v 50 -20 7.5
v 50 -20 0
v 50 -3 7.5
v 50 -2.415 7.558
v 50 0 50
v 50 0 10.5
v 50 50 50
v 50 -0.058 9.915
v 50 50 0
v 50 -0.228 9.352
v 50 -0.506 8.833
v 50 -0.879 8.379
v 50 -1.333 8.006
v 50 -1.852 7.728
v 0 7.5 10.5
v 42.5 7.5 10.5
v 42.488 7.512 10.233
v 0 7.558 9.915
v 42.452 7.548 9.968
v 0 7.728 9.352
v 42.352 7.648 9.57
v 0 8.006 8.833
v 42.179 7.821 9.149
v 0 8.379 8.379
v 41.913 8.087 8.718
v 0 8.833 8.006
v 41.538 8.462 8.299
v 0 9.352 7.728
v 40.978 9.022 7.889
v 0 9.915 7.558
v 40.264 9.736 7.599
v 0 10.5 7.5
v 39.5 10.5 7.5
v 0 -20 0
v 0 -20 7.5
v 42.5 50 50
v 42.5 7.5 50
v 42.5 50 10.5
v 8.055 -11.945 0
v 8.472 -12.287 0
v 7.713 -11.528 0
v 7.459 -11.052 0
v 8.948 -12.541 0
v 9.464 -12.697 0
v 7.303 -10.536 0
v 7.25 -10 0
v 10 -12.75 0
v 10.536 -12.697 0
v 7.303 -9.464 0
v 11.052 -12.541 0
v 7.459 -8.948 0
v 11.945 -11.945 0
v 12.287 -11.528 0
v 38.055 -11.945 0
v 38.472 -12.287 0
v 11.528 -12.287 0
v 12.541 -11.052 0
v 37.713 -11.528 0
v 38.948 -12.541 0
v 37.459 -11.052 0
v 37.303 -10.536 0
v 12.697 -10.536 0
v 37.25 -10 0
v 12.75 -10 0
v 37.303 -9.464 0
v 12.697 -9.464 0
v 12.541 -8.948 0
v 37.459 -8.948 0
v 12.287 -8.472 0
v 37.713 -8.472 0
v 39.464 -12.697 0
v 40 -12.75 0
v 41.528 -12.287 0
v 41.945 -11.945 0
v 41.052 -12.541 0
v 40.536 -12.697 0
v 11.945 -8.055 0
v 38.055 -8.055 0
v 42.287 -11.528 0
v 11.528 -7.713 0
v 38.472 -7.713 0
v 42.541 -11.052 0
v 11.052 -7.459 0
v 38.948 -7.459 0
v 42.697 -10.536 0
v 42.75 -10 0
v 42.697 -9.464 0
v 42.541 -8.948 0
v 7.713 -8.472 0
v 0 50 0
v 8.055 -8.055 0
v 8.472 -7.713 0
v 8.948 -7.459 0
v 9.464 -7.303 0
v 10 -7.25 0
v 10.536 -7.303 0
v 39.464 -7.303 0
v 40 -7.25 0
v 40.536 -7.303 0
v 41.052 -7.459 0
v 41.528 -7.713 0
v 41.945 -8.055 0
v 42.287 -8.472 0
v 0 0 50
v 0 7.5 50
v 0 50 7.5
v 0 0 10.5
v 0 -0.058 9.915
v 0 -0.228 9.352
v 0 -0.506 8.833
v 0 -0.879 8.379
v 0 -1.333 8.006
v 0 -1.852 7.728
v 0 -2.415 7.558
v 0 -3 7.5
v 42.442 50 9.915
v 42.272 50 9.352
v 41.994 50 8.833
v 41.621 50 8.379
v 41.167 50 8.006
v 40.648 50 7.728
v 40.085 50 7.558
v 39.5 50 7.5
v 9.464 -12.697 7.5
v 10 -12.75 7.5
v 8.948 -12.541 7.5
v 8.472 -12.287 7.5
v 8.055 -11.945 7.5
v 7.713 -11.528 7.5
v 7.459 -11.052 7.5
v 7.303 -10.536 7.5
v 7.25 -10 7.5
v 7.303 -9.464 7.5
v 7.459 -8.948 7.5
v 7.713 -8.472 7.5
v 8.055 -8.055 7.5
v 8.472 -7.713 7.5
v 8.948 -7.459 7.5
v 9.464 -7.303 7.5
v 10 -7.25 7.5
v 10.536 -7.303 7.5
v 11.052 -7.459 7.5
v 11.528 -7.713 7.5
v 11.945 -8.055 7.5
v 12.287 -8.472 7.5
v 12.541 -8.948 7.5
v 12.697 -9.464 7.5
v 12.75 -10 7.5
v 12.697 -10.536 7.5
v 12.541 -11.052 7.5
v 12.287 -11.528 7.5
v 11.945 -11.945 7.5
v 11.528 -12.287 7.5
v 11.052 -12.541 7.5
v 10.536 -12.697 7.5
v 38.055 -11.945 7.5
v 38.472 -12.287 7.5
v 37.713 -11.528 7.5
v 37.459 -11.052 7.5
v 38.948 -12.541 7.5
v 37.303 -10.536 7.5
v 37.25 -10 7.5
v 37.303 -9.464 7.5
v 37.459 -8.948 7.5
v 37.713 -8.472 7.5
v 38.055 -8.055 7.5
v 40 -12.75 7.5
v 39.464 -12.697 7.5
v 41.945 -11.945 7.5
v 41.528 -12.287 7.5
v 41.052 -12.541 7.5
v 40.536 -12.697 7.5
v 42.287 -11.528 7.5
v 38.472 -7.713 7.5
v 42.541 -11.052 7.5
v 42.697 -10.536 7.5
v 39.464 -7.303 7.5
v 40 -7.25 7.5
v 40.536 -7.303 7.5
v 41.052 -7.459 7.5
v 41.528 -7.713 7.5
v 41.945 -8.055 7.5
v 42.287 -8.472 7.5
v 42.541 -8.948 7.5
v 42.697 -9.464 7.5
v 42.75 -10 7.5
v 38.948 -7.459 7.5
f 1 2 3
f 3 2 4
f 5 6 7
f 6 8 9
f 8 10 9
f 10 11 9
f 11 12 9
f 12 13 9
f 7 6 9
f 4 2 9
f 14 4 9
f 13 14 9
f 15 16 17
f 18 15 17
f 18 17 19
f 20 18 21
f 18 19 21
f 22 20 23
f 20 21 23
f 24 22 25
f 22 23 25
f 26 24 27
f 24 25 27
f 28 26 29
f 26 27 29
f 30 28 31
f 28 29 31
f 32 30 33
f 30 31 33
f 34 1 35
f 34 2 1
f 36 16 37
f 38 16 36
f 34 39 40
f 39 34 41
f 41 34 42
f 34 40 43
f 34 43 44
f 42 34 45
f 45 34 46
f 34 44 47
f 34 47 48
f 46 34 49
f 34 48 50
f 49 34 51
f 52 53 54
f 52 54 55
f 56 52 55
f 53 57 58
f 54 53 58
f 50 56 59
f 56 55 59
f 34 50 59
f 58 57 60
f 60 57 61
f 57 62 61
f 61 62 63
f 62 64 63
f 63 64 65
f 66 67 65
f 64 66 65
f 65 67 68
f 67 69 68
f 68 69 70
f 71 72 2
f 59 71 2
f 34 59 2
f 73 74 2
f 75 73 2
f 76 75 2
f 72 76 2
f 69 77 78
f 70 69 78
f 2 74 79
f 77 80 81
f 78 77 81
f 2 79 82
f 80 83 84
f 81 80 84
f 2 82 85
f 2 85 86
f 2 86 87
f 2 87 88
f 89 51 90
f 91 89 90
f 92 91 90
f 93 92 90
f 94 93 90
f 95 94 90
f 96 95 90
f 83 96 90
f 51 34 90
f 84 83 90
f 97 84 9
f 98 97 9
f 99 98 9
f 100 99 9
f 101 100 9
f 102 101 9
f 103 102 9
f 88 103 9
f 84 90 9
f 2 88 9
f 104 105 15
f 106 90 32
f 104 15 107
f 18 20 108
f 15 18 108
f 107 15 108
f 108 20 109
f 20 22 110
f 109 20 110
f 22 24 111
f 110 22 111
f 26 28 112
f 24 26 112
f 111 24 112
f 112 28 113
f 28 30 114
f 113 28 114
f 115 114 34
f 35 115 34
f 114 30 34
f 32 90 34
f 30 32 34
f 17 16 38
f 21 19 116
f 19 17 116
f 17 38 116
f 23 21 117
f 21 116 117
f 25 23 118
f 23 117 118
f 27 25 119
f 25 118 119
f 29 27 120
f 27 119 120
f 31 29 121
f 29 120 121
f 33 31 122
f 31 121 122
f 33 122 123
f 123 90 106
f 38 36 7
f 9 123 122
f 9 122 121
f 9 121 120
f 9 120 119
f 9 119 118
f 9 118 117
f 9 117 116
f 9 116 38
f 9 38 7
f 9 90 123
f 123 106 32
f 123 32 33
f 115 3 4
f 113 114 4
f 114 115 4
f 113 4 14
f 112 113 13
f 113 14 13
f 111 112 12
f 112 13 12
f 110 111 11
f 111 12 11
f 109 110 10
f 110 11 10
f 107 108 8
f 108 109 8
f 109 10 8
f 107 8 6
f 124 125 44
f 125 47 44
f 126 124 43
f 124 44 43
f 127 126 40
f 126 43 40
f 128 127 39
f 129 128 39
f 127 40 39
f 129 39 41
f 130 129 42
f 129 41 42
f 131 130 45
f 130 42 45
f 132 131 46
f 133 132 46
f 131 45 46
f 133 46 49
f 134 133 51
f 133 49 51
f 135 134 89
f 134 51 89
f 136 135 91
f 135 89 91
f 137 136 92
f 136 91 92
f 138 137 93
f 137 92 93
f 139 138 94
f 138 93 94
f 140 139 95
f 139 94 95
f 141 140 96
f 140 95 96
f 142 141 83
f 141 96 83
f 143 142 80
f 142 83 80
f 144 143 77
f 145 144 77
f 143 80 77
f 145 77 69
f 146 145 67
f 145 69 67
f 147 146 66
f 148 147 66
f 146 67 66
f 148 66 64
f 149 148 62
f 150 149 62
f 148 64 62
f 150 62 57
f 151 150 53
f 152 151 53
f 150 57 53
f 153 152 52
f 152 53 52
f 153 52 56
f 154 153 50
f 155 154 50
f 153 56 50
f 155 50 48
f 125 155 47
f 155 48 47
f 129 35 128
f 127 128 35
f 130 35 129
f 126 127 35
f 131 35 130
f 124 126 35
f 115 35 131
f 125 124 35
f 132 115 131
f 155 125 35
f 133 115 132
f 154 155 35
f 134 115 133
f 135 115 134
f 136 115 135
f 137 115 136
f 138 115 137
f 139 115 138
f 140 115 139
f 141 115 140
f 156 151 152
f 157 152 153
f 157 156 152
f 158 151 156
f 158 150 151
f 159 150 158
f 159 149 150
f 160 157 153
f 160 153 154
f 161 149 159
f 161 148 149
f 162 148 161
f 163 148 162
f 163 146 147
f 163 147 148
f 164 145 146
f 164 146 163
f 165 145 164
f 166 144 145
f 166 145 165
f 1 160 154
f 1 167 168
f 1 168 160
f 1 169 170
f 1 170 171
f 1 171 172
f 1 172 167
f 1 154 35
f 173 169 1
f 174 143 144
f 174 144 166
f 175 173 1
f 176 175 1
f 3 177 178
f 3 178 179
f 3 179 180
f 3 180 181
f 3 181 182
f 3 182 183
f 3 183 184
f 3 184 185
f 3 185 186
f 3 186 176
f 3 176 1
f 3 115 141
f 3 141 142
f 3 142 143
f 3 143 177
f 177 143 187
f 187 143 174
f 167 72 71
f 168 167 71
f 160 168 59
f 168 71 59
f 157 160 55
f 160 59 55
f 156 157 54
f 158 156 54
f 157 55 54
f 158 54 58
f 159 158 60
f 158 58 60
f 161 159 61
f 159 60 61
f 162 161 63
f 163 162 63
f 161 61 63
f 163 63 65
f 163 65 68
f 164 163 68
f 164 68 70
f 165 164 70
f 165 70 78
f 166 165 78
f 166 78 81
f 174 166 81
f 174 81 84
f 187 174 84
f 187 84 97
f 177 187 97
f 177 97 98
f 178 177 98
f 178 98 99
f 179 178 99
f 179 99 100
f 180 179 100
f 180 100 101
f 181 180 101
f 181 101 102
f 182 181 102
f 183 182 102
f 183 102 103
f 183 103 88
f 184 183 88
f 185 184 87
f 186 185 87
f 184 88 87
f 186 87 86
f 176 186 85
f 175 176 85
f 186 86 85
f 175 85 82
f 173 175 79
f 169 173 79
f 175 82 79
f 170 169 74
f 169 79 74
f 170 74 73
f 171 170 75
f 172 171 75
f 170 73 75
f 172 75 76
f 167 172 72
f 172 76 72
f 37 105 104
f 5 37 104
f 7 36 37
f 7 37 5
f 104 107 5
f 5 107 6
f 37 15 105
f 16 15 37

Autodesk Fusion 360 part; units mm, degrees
sketch "Sketch1" plane through (0, 0, 0) normal (0, 0, 1) x (1, 0, 0)
  line L0 (0, 0) -> (50, 0)
  line L1 (50, 0) -> (50, 50)
  line L2 (0, 7.5) -> (42.5, 7.5)
  line L3 (42.5, 7.5) -> (42.5, 50)
  line L4 (0, 7.5) -> (0, 0)
  line L5 (42.5, 50) -> (50, 50)
  dimension "d1" = -7.5
  dimension "d2" = 50
  dimension "d3" = 50
extrude "Extrude1" add sketch "Sketch1" along normal blind 50
sketch "Sketch4" plane through (0, 0, 0) normal (0, 0, 1) x (1, 0, 0)
  line L0 (50, -20) -> (0, -20)
  line L1 (0, -20) -> (0, 50)
  line L2 (0, 50) -> (50, 50)
  line L3 (50, 50) -> (50, -20)
  point P0 (50, 50)
  dimension "d43" = 70
  dimension "d44" = 50
extrude "Extrude4" add sketch "Sketch4" along normal blind 7.5
sketch "Sketch7" plane through (0, 0, 7.5) normal (0, 0, 1) x (-1, 0, 0)
  line L0 (0, 0) -> (0, 20)
  line L1 (-50, 0) -> (0, 0)
  line L2 (0, 20) -> (-50, 20)
  line L3 (-50, 20) -> (-50, 0)
  point P0 (-10, 10)
  point P1 (-40, 10)
  dimension "d35" = 30
hole "Hole1" at (10, -10, 7.5) at (40, -10, 7.5) direction (0, 0, -1) diameter 5.5 depth 10 tip angle 118
fillet "Fillet1" radius 3 1 edges at (25, 0, 7.5)
fillet "Fillet1" radius 3 2 edges at (21.25, 7.5, 7.5) (42.5, 28.75, 7.5)
